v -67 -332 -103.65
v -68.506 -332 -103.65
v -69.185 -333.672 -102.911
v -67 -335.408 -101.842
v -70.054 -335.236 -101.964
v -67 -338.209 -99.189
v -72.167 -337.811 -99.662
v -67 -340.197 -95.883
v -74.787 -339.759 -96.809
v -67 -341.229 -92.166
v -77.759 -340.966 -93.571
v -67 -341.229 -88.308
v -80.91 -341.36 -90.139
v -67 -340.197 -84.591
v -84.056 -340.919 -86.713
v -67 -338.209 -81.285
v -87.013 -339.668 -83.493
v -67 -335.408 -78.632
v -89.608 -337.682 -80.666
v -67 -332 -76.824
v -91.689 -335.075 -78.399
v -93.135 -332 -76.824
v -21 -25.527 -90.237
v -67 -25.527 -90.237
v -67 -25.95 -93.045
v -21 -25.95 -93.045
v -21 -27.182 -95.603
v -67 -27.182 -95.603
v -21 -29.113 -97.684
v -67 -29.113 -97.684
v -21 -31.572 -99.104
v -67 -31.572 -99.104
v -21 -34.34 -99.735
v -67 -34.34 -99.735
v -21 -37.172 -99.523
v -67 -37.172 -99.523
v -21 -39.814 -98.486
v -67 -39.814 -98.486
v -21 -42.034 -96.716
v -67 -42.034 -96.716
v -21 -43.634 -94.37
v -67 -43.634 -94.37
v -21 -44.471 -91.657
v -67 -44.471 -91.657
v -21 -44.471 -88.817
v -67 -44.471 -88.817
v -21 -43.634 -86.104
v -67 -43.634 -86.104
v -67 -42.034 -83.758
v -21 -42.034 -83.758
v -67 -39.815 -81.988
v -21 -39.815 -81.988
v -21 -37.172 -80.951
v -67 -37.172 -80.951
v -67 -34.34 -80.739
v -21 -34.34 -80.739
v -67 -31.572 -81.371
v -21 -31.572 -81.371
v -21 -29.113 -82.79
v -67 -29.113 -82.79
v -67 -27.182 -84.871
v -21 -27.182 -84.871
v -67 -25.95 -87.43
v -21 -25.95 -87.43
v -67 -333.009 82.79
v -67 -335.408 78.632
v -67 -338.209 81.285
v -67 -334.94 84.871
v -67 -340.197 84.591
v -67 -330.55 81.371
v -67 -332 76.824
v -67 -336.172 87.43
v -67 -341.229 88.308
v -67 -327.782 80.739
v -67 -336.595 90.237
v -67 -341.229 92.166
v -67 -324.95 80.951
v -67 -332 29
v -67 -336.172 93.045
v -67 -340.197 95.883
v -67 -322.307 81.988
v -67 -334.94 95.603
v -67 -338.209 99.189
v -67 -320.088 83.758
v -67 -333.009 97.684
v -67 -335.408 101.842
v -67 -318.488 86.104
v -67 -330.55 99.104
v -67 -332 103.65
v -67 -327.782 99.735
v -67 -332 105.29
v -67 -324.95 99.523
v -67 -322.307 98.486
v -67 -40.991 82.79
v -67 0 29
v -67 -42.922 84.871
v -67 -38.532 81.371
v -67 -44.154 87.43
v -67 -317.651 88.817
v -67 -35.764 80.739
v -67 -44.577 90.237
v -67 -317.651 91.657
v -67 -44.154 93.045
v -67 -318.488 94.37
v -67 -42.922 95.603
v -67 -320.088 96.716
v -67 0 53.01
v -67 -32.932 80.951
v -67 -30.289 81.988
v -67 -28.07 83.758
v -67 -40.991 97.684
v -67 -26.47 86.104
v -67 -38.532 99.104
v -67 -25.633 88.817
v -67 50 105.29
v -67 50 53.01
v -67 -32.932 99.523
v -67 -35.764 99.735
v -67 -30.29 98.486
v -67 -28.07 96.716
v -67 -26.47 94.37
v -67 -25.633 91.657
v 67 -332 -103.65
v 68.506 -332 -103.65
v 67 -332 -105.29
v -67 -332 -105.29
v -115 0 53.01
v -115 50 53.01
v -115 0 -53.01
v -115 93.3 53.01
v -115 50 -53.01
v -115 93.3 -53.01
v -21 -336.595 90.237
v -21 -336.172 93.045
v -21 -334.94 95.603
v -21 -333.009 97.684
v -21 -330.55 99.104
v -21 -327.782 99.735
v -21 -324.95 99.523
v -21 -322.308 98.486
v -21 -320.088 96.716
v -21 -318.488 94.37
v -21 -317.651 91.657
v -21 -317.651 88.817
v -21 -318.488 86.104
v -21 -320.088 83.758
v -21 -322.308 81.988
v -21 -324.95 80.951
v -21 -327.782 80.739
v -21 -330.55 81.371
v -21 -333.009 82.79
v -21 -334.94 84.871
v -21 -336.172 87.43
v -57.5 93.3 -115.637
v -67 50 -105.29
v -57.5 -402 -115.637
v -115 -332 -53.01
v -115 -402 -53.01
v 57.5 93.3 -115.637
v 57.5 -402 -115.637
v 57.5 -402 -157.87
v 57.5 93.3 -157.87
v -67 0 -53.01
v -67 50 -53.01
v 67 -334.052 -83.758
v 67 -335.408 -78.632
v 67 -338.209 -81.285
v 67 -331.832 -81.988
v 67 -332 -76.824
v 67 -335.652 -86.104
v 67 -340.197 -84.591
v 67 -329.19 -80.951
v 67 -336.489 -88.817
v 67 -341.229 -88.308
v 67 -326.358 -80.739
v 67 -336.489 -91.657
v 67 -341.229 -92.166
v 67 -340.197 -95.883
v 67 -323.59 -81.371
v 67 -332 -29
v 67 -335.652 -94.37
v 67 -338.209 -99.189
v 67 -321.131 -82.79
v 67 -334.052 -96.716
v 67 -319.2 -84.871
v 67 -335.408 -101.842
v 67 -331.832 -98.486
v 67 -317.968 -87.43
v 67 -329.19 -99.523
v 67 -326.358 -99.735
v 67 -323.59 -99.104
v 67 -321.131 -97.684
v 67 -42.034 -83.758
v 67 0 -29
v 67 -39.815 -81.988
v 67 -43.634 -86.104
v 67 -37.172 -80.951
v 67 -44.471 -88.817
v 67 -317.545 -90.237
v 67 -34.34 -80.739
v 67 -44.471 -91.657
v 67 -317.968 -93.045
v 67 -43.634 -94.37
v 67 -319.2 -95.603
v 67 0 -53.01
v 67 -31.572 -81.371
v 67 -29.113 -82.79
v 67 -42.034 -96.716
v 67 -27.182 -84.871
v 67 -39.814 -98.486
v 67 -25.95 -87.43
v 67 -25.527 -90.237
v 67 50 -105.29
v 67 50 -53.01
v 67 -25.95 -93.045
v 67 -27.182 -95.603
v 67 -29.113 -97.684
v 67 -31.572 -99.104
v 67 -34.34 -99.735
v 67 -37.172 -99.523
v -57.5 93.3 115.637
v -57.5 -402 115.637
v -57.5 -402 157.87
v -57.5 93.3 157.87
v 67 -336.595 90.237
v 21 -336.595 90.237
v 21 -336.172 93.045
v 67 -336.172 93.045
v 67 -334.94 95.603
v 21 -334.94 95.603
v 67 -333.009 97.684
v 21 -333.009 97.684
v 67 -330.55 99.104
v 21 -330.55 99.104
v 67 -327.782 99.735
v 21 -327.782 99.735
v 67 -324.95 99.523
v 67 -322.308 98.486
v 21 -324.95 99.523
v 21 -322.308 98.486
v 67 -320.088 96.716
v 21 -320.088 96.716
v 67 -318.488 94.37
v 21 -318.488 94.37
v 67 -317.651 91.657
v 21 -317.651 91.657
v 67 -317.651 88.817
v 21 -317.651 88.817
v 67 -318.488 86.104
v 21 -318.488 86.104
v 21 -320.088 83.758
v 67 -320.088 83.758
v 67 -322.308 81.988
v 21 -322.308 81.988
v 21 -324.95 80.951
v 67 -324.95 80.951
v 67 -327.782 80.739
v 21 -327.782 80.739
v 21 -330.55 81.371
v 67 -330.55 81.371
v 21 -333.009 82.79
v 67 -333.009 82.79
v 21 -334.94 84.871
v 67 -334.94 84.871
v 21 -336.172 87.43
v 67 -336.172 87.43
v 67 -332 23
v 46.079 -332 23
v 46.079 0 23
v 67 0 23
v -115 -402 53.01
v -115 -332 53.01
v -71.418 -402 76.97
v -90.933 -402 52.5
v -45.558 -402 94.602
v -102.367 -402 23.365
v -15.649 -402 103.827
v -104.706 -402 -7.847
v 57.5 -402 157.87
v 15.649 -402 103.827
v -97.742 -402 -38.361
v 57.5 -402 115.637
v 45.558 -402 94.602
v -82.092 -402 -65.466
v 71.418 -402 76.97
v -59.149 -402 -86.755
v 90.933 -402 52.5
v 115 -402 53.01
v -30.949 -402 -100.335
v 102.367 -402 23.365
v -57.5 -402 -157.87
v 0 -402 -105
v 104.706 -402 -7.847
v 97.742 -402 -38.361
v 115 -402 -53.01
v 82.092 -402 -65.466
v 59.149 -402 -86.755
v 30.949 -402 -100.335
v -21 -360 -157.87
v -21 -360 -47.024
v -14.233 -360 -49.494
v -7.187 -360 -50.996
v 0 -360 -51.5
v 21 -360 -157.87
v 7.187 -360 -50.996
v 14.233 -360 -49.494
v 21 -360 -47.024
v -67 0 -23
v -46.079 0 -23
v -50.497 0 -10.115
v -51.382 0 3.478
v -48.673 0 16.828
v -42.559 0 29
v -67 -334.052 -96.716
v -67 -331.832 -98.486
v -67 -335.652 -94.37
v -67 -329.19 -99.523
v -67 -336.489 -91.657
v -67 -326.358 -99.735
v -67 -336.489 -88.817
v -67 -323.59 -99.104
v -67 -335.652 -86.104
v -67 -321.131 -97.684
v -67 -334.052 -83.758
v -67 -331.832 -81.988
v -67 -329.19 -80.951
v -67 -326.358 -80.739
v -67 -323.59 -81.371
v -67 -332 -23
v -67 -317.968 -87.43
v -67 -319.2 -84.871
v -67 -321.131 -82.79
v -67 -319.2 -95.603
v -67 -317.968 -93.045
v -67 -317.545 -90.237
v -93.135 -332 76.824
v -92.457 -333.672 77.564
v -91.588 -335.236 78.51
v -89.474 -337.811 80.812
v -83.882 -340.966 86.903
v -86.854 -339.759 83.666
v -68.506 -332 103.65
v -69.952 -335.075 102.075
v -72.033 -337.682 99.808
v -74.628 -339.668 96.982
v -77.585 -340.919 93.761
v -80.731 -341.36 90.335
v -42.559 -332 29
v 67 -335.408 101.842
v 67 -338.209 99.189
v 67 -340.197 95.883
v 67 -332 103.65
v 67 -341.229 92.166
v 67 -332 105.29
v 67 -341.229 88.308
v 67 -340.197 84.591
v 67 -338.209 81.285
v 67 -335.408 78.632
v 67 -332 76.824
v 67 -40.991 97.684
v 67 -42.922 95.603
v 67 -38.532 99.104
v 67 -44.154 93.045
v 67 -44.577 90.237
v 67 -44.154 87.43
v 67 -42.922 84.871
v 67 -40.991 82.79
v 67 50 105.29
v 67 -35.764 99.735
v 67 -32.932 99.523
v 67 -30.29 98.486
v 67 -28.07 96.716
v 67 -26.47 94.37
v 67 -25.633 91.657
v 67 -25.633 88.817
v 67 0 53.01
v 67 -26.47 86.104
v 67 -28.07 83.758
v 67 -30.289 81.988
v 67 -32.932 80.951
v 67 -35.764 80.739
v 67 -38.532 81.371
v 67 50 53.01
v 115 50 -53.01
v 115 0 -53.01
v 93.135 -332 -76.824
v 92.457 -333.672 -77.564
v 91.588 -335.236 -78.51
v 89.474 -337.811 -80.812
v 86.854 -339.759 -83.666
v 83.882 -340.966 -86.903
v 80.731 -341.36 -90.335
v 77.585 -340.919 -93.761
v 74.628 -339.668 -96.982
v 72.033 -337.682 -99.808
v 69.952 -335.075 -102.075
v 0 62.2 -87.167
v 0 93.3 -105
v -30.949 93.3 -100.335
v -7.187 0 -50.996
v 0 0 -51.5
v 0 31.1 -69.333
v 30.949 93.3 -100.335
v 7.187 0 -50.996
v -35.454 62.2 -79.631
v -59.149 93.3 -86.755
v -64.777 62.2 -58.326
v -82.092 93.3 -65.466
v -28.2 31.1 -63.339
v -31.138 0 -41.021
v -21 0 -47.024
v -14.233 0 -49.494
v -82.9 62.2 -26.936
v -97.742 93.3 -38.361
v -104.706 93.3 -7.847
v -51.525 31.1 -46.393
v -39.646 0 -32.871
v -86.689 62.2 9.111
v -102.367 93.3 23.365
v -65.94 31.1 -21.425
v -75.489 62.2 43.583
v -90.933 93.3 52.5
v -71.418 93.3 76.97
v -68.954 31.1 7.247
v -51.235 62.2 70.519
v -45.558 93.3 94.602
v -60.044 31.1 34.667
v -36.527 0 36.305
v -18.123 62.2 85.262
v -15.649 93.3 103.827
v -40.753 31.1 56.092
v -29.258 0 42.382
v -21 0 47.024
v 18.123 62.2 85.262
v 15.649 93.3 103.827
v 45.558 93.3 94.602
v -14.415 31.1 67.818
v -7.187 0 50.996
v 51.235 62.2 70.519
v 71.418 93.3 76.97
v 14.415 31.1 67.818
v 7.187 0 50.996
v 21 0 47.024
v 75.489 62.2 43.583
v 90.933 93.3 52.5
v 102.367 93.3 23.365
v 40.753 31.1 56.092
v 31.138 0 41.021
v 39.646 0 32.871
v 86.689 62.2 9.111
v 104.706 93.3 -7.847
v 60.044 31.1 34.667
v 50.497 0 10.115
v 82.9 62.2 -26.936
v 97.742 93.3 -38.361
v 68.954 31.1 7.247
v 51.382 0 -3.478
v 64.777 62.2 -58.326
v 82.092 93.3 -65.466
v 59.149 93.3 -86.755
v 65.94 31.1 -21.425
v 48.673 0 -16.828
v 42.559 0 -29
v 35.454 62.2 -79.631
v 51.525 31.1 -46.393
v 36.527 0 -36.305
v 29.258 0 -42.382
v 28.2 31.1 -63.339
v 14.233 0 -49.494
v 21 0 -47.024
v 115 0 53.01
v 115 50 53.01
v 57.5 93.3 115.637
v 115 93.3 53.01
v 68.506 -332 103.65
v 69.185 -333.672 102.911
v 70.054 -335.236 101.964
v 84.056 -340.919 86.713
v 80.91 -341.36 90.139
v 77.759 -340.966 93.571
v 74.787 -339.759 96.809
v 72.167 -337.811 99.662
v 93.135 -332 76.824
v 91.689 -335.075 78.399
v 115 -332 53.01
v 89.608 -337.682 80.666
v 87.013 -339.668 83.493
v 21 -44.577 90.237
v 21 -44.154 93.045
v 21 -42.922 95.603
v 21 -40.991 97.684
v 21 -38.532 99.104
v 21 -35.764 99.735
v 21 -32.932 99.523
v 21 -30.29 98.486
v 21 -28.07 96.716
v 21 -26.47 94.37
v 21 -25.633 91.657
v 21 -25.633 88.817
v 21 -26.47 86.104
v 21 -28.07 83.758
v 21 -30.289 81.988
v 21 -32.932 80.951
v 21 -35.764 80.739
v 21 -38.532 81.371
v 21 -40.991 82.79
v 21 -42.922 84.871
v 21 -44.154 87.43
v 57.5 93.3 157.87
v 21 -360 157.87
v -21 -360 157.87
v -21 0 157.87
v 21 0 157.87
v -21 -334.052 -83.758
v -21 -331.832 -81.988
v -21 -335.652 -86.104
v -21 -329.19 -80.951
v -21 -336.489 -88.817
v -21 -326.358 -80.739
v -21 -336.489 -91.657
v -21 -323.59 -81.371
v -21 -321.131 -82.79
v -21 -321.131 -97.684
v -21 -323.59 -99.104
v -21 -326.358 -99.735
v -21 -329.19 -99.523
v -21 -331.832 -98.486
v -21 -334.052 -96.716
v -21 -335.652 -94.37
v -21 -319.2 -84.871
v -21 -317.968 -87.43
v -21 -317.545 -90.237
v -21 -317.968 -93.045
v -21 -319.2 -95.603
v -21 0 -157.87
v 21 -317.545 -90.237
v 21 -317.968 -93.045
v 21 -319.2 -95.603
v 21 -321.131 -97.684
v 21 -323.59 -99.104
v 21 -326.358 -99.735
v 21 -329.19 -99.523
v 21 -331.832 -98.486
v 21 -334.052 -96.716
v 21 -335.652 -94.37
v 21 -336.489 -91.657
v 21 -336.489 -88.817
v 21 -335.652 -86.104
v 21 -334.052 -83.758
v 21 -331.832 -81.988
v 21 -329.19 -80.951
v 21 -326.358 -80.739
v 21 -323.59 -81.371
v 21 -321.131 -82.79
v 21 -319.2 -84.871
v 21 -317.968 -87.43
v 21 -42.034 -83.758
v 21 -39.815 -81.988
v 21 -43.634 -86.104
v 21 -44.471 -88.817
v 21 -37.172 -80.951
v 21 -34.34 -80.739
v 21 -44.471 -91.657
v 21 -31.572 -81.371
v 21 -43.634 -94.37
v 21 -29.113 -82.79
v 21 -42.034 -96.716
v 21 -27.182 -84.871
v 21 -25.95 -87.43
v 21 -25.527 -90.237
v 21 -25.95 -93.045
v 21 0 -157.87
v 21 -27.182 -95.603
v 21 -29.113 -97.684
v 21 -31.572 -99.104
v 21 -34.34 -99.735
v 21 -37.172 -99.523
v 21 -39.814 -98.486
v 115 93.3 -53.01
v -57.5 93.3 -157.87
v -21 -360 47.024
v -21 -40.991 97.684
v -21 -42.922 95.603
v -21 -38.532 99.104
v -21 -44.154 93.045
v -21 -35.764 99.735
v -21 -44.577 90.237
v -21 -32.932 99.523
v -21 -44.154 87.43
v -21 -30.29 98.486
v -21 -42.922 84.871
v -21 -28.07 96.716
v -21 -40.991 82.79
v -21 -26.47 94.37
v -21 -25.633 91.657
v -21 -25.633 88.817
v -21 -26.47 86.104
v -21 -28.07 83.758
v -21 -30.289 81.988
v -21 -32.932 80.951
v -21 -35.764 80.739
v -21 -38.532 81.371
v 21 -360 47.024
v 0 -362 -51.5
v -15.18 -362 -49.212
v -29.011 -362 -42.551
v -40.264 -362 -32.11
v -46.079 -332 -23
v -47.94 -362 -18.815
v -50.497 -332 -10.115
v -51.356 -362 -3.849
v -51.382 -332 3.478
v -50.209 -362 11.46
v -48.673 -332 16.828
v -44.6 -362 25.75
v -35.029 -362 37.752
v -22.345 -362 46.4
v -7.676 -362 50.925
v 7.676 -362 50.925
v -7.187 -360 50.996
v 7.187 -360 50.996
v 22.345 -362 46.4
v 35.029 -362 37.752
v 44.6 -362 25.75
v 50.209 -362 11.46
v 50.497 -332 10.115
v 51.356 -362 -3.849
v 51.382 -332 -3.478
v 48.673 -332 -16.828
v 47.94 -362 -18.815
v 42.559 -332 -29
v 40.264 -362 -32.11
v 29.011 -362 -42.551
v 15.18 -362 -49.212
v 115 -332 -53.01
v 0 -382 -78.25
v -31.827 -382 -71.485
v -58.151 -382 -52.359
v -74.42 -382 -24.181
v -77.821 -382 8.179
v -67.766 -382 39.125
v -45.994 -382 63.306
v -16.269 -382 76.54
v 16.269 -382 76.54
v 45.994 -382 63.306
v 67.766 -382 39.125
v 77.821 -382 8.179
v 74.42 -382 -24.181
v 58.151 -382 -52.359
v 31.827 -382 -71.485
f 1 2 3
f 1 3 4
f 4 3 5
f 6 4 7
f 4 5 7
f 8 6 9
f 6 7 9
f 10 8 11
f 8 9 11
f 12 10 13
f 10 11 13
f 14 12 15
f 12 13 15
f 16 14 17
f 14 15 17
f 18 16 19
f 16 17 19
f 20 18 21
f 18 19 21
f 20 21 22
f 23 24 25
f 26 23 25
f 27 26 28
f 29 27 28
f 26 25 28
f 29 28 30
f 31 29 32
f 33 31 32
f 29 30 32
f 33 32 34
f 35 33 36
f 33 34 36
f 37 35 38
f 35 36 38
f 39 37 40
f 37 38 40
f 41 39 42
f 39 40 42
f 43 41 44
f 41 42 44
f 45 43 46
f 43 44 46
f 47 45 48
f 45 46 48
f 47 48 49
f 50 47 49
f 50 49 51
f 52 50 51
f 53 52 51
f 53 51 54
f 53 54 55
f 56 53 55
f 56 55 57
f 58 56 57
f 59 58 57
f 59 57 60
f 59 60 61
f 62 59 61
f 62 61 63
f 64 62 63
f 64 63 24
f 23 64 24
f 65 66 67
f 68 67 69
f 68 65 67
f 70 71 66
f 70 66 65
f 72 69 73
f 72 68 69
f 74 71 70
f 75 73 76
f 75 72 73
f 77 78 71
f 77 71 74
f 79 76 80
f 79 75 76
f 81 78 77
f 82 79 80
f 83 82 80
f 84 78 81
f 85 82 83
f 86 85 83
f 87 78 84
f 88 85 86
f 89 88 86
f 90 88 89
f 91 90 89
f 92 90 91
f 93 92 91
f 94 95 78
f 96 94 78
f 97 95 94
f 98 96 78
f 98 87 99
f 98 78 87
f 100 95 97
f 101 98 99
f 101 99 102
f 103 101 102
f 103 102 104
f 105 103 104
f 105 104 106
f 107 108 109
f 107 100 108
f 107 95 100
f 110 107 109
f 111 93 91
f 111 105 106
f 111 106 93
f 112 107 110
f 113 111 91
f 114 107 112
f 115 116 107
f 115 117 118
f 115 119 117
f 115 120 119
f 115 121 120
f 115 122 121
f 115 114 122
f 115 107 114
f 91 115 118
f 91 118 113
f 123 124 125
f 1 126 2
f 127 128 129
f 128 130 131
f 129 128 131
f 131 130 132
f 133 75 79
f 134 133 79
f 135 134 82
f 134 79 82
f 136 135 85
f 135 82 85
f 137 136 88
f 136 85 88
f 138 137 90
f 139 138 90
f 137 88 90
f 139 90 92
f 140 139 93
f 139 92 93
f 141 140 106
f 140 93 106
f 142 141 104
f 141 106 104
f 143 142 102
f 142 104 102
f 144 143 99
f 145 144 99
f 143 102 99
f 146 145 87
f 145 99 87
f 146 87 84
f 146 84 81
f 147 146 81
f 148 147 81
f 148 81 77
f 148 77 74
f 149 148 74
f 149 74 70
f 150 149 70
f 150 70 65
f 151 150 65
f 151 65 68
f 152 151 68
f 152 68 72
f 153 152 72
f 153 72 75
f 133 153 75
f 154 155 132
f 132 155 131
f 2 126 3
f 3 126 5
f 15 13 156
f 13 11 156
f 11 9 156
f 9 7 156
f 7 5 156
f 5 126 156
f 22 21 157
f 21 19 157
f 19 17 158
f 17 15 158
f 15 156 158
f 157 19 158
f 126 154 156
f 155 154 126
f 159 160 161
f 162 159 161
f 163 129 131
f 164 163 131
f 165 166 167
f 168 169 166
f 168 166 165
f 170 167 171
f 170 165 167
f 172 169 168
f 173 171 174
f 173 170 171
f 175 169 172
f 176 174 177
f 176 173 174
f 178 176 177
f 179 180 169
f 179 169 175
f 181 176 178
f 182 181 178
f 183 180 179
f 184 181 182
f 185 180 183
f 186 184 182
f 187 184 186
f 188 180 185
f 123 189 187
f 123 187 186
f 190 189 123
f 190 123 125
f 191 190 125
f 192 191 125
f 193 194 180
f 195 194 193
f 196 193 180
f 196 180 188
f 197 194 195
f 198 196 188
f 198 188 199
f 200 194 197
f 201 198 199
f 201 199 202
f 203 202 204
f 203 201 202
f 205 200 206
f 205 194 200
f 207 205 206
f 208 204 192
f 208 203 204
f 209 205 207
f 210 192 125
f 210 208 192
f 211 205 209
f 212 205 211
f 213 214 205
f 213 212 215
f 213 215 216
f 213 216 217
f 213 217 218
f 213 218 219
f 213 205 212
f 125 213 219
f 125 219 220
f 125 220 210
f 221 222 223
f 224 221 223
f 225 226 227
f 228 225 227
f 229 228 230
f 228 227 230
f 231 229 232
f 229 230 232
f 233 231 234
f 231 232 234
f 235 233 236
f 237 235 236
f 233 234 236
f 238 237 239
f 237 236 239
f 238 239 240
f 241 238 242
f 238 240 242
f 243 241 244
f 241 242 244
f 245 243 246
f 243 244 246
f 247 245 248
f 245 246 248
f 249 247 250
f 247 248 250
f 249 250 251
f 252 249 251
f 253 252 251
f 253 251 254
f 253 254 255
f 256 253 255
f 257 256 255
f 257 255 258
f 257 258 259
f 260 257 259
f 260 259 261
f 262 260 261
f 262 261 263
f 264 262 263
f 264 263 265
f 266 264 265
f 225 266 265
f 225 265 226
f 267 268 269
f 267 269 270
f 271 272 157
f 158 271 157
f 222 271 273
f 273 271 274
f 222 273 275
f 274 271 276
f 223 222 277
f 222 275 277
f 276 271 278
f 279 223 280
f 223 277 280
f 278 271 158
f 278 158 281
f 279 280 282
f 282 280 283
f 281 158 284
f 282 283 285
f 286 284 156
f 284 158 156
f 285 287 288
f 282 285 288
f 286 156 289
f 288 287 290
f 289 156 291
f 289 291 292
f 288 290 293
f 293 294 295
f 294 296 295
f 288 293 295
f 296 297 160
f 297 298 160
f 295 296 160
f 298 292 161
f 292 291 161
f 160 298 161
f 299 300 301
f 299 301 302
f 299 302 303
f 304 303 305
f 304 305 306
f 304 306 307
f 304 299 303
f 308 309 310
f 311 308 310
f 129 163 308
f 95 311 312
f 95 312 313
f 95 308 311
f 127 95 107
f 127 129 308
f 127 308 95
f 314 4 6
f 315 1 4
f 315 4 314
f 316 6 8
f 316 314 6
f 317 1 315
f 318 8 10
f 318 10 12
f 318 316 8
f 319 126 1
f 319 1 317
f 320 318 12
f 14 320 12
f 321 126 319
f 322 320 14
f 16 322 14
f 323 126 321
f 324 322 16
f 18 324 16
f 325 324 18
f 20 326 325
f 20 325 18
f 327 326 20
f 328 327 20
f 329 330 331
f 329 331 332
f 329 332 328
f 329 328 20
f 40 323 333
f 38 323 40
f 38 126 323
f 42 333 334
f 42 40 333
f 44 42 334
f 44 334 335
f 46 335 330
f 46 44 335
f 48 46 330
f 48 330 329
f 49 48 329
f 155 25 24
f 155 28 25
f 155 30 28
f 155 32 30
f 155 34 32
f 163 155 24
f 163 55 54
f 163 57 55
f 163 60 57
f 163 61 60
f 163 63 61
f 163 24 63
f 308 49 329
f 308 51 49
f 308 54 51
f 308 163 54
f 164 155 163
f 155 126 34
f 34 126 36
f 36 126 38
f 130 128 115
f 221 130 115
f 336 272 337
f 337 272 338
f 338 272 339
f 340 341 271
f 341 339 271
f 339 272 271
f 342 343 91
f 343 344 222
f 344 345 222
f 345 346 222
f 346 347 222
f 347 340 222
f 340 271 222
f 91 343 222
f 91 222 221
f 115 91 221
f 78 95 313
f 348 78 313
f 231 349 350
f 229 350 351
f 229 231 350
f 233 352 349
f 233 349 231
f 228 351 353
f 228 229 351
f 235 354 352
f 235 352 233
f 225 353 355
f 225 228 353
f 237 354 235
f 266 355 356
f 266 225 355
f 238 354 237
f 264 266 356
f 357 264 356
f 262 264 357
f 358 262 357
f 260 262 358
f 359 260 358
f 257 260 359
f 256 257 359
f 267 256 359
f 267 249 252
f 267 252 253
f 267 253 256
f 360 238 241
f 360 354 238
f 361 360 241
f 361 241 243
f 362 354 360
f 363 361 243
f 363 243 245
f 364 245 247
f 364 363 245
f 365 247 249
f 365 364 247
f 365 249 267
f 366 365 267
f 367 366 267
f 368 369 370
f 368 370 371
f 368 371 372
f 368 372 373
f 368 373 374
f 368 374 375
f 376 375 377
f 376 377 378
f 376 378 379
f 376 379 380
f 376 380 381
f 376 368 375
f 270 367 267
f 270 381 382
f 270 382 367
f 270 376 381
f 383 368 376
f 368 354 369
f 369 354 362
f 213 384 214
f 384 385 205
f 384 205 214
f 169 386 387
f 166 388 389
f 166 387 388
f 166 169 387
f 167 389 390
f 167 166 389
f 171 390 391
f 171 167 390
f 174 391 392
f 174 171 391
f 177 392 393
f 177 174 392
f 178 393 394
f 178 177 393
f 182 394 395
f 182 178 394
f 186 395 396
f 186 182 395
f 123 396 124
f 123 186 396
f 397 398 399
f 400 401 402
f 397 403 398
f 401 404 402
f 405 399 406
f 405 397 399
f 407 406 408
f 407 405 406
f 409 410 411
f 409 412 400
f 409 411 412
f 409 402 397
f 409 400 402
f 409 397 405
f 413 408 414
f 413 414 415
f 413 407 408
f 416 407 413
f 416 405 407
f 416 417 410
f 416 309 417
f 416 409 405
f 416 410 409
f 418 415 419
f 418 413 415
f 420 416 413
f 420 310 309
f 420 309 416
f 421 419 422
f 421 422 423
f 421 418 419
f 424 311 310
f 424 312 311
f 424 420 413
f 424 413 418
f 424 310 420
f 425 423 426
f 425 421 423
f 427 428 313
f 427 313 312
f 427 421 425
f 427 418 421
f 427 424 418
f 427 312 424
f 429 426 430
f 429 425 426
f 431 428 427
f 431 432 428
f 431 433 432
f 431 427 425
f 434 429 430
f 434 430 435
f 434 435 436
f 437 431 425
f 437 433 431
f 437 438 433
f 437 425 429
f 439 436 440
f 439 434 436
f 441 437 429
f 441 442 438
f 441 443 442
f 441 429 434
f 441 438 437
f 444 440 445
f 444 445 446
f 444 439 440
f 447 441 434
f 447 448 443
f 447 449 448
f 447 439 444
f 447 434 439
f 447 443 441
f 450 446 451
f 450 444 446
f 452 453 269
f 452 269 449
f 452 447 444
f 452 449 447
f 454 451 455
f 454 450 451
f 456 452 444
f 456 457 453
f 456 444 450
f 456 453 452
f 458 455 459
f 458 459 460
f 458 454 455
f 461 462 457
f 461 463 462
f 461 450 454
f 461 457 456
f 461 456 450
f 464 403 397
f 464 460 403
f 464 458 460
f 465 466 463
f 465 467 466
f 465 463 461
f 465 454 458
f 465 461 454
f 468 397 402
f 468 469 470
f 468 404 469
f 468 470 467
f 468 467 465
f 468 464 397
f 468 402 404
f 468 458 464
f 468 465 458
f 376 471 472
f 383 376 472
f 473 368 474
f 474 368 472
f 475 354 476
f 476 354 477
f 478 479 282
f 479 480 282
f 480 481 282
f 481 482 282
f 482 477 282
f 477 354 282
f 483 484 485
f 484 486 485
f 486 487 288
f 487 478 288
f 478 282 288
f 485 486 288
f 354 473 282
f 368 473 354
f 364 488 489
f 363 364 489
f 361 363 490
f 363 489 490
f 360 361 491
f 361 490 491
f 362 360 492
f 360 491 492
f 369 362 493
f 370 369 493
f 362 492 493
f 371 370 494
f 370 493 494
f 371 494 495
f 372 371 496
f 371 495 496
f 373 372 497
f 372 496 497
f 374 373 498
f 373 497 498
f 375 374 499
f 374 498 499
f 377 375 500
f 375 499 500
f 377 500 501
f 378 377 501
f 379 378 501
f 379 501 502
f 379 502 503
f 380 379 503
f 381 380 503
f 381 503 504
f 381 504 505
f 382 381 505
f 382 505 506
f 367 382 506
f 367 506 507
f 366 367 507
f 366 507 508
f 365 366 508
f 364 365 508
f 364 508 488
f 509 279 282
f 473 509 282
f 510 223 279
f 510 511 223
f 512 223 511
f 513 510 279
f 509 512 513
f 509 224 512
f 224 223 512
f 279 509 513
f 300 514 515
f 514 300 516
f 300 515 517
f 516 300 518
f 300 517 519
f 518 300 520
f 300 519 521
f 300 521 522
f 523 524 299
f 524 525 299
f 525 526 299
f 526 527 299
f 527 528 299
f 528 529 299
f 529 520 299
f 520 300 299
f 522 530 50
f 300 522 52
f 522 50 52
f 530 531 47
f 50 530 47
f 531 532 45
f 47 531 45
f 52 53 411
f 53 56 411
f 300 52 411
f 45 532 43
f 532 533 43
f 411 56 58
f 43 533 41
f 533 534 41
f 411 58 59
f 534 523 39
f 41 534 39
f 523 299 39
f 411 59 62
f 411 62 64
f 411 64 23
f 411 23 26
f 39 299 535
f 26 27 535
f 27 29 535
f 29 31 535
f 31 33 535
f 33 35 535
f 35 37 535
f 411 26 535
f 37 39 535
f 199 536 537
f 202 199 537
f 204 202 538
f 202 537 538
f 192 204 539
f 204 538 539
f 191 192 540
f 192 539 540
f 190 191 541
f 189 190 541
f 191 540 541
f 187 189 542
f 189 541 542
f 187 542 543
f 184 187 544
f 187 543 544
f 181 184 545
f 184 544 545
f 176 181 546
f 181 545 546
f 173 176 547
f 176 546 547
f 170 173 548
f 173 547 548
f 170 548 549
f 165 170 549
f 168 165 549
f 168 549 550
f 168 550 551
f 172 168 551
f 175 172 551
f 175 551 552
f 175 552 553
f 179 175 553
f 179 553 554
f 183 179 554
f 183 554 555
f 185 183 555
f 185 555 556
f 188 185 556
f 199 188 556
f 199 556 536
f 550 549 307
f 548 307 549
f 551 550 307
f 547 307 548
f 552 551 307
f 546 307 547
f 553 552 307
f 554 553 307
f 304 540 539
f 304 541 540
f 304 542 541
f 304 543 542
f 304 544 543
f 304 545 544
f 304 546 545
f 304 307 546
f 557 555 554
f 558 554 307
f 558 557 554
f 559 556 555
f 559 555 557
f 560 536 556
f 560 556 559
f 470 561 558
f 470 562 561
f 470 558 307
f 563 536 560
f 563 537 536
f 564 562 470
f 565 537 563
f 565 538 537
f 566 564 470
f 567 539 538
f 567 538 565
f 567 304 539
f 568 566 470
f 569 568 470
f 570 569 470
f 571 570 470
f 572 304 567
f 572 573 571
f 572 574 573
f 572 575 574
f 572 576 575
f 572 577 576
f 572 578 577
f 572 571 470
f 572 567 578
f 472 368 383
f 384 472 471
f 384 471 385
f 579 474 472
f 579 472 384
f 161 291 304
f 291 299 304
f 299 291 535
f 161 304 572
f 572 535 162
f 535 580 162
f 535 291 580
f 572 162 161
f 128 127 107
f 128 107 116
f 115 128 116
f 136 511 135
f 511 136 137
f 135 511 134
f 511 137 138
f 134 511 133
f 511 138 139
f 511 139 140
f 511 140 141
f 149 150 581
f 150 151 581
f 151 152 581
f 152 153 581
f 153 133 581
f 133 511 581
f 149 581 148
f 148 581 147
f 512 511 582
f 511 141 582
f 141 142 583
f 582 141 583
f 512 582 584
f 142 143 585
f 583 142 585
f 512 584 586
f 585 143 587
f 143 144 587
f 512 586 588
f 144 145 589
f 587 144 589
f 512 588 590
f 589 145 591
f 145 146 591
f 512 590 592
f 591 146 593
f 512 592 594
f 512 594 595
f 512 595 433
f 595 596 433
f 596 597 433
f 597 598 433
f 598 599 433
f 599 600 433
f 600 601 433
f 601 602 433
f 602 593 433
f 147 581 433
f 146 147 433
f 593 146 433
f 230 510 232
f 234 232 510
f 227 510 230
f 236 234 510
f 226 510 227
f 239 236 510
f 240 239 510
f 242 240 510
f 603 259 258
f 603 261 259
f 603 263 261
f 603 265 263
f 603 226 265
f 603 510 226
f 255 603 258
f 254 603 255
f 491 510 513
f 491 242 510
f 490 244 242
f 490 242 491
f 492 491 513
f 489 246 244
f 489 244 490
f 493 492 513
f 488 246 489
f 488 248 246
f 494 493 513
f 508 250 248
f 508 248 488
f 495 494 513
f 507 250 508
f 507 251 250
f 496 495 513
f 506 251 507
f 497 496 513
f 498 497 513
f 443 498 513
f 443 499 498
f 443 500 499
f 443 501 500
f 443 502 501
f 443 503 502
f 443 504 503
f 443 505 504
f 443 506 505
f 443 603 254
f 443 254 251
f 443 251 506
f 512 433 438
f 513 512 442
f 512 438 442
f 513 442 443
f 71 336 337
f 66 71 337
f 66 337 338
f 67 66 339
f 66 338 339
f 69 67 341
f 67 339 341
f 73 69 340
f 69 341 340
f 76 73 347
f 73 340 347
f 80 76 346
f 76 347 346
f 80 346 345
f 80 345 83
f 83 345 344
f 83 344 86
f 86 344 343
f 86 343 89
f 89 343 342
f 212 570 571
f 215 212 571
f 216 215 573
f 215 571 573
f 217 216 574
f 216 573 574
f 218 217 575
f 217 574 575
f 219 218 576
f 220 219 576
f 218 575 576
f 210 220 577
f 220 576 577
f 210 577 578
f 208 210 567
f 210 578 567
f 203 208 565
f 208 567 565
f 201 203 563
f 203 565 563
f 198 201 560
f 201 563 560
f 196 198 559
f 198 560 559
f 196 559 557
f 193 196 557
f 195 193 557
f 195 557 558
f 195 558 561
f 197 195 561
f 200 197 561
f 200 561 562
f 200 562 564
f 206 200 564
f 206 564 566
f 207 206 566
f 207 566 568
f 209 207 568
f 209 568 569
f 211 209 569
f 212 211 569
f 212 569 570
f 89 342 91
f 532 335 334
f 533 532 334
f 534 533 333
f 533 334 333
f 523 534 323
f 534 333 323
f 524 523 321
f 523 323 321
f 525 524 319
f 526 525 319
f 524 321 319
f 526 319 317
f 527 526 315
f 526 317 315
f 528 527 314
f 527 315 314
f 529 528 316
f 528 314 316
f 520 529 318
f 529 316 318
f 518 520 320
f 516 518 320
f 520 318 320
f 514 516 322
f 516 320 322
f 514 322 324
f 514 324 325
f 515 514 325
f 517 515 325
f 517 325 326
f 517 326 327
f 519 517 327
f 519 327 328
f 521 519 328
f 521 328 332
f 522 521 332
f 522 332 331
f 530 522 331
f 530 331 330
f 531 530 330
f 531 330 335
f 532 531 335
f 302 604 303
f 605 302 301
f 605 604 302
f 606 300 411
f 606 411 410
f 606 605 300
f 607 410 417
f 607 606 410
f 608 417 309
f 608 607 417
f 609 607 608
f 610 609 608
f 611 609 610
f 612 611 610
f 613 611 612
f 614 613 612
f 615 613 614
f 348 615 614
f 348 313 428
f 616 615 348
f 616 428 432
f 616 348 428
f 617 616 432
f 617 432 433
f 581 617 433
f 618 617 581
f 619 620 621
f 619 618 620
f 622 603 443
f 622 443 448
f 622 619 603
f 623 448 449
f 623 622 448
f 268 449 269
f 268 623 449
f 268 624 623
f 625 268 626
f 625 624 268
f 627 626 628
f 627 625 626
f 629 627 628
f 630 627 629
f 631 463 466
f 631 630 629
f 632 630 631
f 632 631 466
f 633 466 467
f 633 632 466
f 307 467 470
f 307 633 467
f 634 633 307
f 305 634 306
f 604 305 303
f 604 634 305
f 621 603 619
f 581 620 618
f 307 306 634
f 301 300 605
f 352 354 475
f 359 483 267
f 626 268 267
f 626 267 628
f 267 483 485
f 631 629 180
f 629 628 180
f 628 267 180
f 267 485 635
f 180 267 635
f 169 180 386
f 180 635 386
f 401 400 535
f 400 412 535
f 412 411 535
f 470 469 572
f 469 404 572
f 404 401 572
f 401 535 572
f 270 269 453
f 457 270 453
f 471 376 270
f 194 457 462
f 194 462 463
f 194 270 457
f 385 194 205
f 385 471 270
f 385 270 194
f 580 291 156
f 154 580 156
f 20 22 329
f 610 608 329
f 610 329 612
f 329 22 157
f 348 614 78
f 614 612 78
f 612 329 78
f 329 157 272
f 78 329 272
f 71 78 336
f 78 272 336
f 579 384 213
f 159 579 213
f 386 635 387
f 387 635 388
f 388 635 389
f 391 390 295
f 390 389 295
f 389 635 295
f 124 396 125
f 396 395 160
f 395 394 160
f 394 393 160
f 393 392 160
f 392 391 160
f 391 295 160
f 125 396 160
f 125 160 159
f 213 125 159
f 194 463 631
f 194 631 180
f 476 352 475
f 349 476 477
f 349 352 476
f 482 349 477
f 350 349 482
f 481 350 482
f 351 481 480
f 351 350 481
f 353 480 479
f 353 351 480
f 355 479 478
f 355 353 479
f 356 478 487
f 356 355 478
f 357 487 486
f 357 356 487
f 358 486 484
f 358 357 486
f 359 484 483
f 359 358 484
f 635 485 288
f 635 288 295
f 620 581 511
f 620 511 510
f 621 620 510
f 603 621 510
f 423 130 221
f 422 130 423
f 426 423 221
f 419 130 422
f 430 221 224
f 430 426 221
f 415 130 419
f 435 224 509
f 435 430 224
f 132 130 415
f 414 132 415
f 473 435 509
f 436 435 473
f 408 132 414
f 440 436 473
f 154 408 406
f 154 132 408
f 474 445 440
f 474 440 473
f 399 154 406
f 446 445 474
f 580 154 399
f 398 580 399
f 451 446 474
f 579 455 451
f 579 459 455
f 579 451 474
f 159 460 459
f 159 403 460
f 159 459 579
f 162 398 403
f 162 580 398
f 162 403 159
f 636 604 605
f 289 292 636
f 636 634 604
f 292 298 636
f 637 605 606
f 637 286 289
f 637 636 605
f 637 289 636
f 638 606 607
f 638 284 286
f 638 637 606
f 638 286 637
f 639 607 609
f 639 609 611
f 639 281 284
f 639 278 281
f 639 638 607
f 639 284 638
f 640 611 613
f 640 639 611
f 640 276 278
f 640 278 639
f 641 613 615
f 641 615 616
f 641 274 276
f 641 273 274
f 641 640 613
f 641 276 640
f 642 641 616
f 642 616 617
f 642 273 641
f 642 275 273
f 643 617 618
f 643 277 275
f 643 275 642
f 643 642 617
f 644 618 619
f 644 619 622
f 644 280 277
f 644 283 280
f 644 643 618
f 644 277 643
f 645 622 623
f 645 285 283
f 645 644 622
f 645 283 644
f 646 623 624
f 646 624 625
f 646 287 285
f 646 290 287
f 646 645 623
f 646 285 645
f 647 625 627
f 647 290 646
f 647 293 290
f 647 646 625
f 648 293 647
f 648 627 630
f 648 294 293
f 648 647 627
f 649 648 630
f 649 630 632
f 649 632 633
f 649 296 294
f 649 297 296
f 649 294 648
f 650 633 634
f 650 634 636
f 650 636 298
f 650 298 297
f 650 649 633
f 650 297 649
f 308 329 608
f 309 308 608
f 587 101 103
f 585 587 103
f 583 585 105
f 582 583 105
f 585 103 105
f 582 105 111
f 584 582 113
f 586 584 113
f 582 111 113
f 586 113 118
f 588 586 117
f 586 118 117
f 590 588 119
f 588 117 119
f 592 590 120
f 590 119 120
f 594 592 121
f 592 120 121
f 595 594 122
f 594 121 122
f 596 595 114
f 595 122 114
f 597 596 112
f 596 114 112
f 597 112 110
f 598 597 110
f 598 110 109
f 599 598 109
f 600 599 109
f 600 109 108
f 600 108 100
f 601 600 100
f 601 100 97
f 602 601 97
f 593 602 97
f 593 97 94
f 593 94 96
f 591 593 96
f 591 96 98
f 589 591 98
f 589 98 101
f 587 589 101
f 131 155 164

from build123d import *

# Parameters (mm, degrees)
SALIENTE_EXTRUIR1_DEPTH      = 77.5
SALIENTE_EXTRUIR1_DEPTH_BACK = 77.5
CROQUIS3_W                   = 82.87
CROQUIS3_H                   = 362
CROQUIS4_W                   = 230
CROQUIS4_H                   = 315.74
CROQUIS4_R                   = 110
SALIENTE_EXTRUIR2_DEPTH      = 495.3
CORTAR_EXTRUIR1_DEPTH        = 447.936166471
CORTAR_EXTRUIR1_DEPTH_BACK   = 447.936166471
CROQUIS5_W                   = 42
CROQUIS5_H                   = 360
CROQUIS6_W                   = 140.888518715
CROQUIS6_H                   = 52
CROQUIS6_W_2                 = 161.625356967
CORTAR_EXTRUIR2_DEPTH        = 332
CORTAR_EXTRUIR3_START        = -495.3
CORTAR_EXTRUIR3_DEPTH        = 495.3
CROQUIS12_R                  = 9.525
CORTAR_EXTRUIR9_DEPTH        = 230
CROQUIS15_R                  = 14.29
CORTAR_EXTRUIR10_DEPTH       = 48
CORTAR_EXTRUIR11_START       = -48
CROQUIS16_R                  = 14.29
CORTAR_EXTRUIR11_DEPTH       = 48
CROQUIS18_W                  = 231.274148036
CROQUIS18_H                  = 332
CORTAR_EXTRUIR12_DEPTH       = 48
CROQUIS19_W                  = 231.274148036
CROQUIS19_H                  = 332
CORTAR_EXTRUIR13_DEPTH       = 48
CROQUIS20_W                  = 52.279992223
CROQUIS20_H                  = 50
CORTAR_EXTRUIR14_DEPTH       = 48
CROQUIS21_W                  = 52.279992223
CROQUIS21_H                  = 50
CORTAR_EXTRUIR15_DEPTH       = 48


with BuildPart() as part:
    # Croquis1 → Revolución1 (revolve)
    with BuildSketch(Plane.XY, mode=Mode.PRIVATE) as revoluci_n1_sk:
        Polygon((-110, 93.3), (-105, 93.3), (-51.5, 0), (-51.5, -362), (-105, -402), (-110, -402), align=None)
    revolve(revoluci_n1_sk.sketch.rotate(Axis((0, 0, 0), (0, 1, 0)), 270), axis=Axis((0, 0, 0), (0, 1, 0)))

    # Croquis3 → Saliente-Extruir1 (add, two sides: drawn at the far end of the back side and taken through both)
    with BuildSketch(Plane(origin=(0, 0, 0), x_dir=(0, 0, -1), z_dir=(1, 0, 0)).offset(-SALIENTE_EXTRUIR1_DEPTH_BACK)):
        with Locations((116.435, -181)):
            Rectangle(CROQUIS3_W, CROQUIS3_H)
        with Locations((-116.435, -181)):
            Rectangle(CROQUIS3_W, CROQUIS3_H)
    extrude(amount=SALIENTE_EXTRUIR1_DEPTH + SALIENTE_EXTRUIR1_DEPTH_BACK)

    # Croquis4 → Saliente-Extruir2 (add)
    with BuildSketch(Plane(origin=(0, 93.3, 0), x_dir=(1, 0, 0), z_dir=(0, 1, 0))):
        Rectangle(CROQUIS4_W, CROQUIS4_H)
        Circle(CROQUIS4_R, mode=Mode.SUBTRACT)
    extrude(amount=-SALIENTE_EXTRUIR2_DEPTH)

    # Croquis5 → Cortar-Extruir1 (cut, two sides: drawn at the far end of the back side and taken through both)
    with BuildSketch(Plane.XY.offset(-CORTAR_EXTRUIR1_DEPTH_BACK)):
        with Locations((0, -180)):
            Rectangle(CROQUIS5_W, CROQUIS5_H)
    extrude(amount=CORTAR_EXTRUIR1_DEPTH + CORTAR_EXTRUIR1_DEPTH_BACK, mode=Mode.SUBTRACT)

    # Croquis6 → Cortar-Extruir2 (cut)
    with BuildSketch(Plane(origin=(0, 0, 0), x_dir=(1, 0, 0), z_dir=(0, 1, 0))):
        with Locations((-100.594259358, -3)):
            Rectangle(CROQUIS6_W, CROQUIS6_H)
        with Locations((110.962678484, 3)):
            Rectangle(CROQUIS6_W_2, CROQUIS6_H)
    extrude(amount=-CORTAR_EXTRUIR2_DEPTH, mode=Mode.SUBTRACT)

    # Croquis7 → Cortar-Extruir3 (cut)
    with BuildSketch(Plane(origin=(0, 93.3, 0), x_dir=(1, 0, 0), z_dir=(0, 1, 0)).offset(CORTAR_EXTRUIR3_START)):
        Polygon((-115, 157.87), (-57.5, 157.87), (-57.5, 115.637074018), (-115, 53.01), align=None)
        Polygon((57.5, 115.637074018), (57.5, 157.87), (115, 157.87), (115, 53.01), align=None)
        Polygon((115, -157.87), (57.5, -157.87), (57.5, -115.637074018), (115, -53.01), align=None)
        Polygon((-57.5, -115.637074018), (-57.5, -157.87), (-115, -157.87), (-115, -53.01), align=None)
    extrude(amount=CORTAR_EXTRUIR3_DEPTH, mode=Mode.SUBTRACT)

    # Croquis12 → Cortar-Extruir9 (cut)
    with BuildSketch(Plane.ZY.offset(115)):
        with Locations(Location((-90.237074018, -327.07, 0), (0, 0, 90))):
            Circle(CROQUIS12_R)
        with Locations(Location((-90.237074018, -35.052, 0), (0, 0, 90))):
            Circle(CROQUIS12_R)
        with Locations(Location((90.237074018, -35.052, 0), (0, 0, 270))):
            Circle(CROQUIS12_R)
        with Locations(Location((90.237074018, -327.07, 0), (0, 0, 270))):
            Circle(CROQUIS12_R)
    extrude(amount=-CORTAR_EXTRUIR9_DEPTH, mode=Mode.SUBTRACT)

    # Croquis15 → Cortar-Extruir10 (cut)
    with BuildSketch(Plane.ZY.offset(115)):
        with Locations((-90.237074018, -35.052)):
            Circle(CROQUIS15_R)
        with Locations((90.237074018, -35.052)):
            Circle(CROQUIS15_R)
        with Locations((90.237074018, -327.07)):
            Circle(CROQUIS15_R)
        with Locations((-90.237074018, -327.07)):
            Circle(CROQUIS15_R)
    extrude(amount=-CORTAR_EXTRUIR10_DEPTH, mode=Mode.SUBTRACT)

    # Croquis16 → Cortar-Extruir11 (cut)
    with BuildSketch(Plane(origin=(115, 0, 0), x_dir=(0, 0, -1), z_dir=(1, 0, 0)).offset(CORTAR_EXTRUIR11_START)):
        with Locations(Location((-90.237074018, -35.052, 0), (0, 0, 180))):
            Circle(CROQUIS16_R)
        with Locations(Location((90.237074018, -35.052, 0), (0, 0, 180))):
            Circle(CROQUIS16_R)
        with Locations(Location((90.237074018, -327.07, 0), (0, 0, 180))):
            Circle(CROQUIS16_R)
        with Locations(Location((-90.237074018, -327.07, 0), (0, 0, 180))):
            Circle(CROQUIS16_R)
    extrude(amount=CORTAR_EXTRUIR11_DEPTH, mode=Mode.SUBTRACT)

    # Croquis18 → Cortar-Extruir12 (cut)
    with BuildSketch(Plane(origin=(115, 0, 0), x_dir=(0, 0, -1), z_dir=(1, 0, 0))):
        with Locations((0, -166)):
            Rectangle(CROQUIS18_W, CROQUIS18_H)
    extrude(amount=-CORTAR_EXTRUIR12_DEPTH, mode=Mode.SUBTRACT)

    # Croquis19 → Cortar-Extruir13 (cut)
    with BuildSketch(Plane.ZY.offset(115)):
        with Locations((0, -166)):
            Rectangle(CROQUIS19_W, CROQUIS19_H)
    extrude(amount=-CORTAR_EXTRUIR13_DEPTH, mode=Mode.SUBTRACT)

    # Croquis20 → Cortar-Extruir14 (cut)
    with BuildSketch(Plane.ZY.offset(115)):
        with Locations((-79.149996112, 25)):
            Rectangle(CROQUIS20_W, CROQUIS20_H)
        with Locations((79.149996112, 25)):
            Rectangle(CROQUIS20_W, CROQUIS20_H)
    extrude(amount=-CORTAR_EXTRUIR14_DEPTH, mode=Mode.SUBTRACT)

    # Croquis21 → Cortar-Extruir15 (cut)
    with BuildSketch(Plane(origin=(115, 0, 0), x_dir=(0, 0, -1), z_dir=(1, 0, 0))):
        with Locations((79.149996112, 25)):
            Rectangle(CROQUIS21_W, CROQUIS21_H)
        with Locations((-79.149996112, 25)):
            Rectangle(CROQUIS21_W, CROQUIS21_H)
    extrude(amount=-CORTAR_EXTRUIR15_DEPTH, mode=Mode.SUBTRACT)


solid = part.part
